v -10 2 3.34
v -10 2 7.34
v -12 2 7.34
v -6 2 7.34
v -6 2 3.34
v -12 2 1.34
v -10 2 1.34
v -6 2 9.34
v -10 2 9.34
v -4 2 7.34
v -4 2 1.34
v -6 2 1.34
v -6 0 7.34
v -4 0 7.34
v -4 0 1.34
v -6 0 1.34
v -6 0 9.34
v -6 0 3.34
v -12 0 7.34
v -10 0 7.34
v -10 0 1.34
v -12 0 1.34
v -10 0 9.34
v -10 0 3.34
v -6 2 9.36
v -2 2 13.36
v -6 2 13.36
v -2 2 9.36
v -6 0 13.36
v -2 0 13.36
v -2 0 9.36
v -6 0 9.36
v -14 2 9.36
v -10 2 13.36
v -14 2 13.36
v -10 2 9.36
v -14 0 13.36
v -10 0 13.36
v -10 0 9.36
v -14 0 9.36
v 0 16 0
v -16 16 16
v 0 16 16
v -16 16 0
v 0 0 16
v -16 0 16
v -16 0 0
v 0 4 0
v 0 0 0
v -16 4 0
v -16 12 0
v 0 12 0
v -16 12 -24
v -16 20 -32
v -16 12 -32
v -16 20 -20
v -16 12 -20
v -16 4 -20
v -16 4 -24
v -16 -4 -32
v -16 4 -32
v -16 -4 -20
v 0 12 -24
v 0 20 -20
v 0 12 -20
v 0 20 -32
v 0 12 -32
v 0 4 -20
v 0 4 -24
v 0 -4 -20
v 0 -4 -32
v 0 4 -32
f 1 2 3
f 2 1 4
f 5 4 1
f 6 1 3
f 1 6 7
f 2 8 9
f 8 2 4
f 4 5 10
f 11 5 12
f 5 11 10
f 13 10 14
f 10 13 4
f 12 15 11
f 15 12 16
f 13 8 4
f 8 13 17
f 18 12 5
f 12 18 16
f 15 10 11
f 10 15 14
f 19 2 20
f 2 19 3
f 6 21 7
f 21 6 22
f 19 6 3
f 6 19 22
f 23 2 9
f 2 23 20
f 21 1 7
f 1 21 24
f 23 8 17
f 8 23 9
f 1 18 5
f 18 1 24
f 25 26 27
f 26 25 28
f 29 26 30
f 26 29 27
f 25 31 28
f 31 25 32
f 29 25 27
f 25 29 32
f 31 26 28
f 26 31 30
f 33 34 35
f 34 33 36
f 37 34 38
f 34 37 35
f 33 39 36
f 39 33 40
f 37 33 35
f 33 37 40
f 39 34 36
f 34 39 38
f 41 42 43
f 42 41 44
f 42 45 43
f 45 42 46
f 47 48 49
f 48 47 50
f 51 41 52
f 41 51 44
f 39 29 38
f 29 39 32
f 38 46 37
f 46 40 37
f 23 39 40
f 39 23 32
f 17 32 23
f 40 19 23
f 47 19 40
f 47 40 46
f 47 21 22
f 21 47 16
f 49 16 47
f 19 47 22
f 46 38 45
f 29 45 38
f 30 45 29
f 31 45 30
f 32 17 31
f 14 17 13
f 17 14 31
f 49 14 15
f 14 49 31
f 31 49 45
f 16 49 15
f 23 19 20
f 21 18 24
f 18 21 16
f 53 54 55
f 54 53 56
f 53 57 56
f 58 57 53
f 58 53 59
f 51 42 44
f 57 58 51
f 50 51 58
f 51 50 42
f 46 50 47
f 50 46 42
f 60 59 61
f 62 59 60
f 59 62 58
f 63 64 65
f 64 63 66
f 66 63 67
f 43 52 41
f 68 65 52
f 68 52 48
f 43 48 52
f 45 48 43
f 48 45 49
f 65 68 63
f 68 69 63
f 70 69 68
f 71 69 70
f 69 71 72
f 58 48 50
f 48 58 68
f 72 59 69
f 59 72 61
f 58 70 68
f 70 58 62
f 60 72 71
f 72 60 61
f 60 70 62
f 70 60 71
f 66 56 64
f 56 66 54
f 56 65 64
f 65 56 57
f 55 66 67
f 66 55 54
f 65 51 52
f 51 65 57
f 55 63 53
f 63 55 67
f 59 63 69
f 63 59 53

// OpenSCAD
// [FL_INDEX: keywords="openscad, 3d_parametric, Parametric_Creeper, csg_solid" | COT="Parametric OpenSCAD design from 3DCodeverse"]
// Title: Parametric Creeper

// Minecraft Creeper Keychain
// v2, now with facial features and a better keychain attachment
// Nudel 2011

//set to 0 for no facial expressions
face_depth = 1;//[0,1]

which_face="scary";//[happy,scary]

//radius of hole for keychain
hole_size = 0; // [0:2]  

creeper(which_face);
module creeper(f){

/*do_scary_face = 0;
do_happy_face = 1;*/

rotate([0,0,90]) //rotated to lay flat
scale(2) //1 pixel = 2mm

difference(){

union()
{

	//Head
	difference(){	
		cube([8,8,8 ]);

if(face_depth>0){
	
	if(f=="scary"){
	//Scary face O_O
	translate([0,0,-0.33])
	union(){
		for(i=[2,5]) {
			#translate([-face_depth,i,1]) cube([face_depth*2,1,3]);
		}
		for(i=[3,4]) {
			#translate([-face_depth,i,2]) cube([face_depth*2,1,3]);
		}
		for(i=[1,5]) {
			#translate([-face_depth,i,5+0.01]) cube([face_depth*2,2,2]);
		}
	}
	}else{
	//Happy face ^_^
	translate([8,0,-0.33])
	union(){
		for(i=[2,5]) {#translate([-face_depth,i,2]) cube([face_depth*2,1,2]);}
		for(i=[3,4]) {#translate([-face_depth,i,1]) cube([face_depth*2,1,2]);}
		for(i=[1,5]) {#translate([-face_depth,i,5]) cube([face_depth*2,2,2]);}
	}
	}
}

}

	//Body
	translate([2,0,-12]) cube([4,8,12]);

	//Legs
	translate([0,0,2]) //moved a bit up to attach to the body
	union()
	{
		translate([-2,0,-18]) cube([4,4,6]);
		translate([-2,4,-18]) cube([4,4,6]);
		translate([ 6,0,-18]) cube([4,4,6]);
		translate([ 6,4,-18]) cube([4,4,6]);
	}

/*
// Old v1 chain attachment
rotate([0,90,0]) 
translate([-8,4,5])
{

#rotate_extrude(convexity = 10,$fn=20)
translate([3, 0, 0])
circle(r = 1,$fn=20);

}
*/

}

if(hole_size>0){
	//Hole in head for piercing equipment.
	//You might have to experiment with this to make it fit your keychain.
	rotate([0,90,0])
	translate([-8,0,4])
	{
		rotate_extrude(convexity = 10,$fn=20)
		translate([3, 0, 0])
		circle(r = hole_size,$fn=20);
	}
}


}
}
